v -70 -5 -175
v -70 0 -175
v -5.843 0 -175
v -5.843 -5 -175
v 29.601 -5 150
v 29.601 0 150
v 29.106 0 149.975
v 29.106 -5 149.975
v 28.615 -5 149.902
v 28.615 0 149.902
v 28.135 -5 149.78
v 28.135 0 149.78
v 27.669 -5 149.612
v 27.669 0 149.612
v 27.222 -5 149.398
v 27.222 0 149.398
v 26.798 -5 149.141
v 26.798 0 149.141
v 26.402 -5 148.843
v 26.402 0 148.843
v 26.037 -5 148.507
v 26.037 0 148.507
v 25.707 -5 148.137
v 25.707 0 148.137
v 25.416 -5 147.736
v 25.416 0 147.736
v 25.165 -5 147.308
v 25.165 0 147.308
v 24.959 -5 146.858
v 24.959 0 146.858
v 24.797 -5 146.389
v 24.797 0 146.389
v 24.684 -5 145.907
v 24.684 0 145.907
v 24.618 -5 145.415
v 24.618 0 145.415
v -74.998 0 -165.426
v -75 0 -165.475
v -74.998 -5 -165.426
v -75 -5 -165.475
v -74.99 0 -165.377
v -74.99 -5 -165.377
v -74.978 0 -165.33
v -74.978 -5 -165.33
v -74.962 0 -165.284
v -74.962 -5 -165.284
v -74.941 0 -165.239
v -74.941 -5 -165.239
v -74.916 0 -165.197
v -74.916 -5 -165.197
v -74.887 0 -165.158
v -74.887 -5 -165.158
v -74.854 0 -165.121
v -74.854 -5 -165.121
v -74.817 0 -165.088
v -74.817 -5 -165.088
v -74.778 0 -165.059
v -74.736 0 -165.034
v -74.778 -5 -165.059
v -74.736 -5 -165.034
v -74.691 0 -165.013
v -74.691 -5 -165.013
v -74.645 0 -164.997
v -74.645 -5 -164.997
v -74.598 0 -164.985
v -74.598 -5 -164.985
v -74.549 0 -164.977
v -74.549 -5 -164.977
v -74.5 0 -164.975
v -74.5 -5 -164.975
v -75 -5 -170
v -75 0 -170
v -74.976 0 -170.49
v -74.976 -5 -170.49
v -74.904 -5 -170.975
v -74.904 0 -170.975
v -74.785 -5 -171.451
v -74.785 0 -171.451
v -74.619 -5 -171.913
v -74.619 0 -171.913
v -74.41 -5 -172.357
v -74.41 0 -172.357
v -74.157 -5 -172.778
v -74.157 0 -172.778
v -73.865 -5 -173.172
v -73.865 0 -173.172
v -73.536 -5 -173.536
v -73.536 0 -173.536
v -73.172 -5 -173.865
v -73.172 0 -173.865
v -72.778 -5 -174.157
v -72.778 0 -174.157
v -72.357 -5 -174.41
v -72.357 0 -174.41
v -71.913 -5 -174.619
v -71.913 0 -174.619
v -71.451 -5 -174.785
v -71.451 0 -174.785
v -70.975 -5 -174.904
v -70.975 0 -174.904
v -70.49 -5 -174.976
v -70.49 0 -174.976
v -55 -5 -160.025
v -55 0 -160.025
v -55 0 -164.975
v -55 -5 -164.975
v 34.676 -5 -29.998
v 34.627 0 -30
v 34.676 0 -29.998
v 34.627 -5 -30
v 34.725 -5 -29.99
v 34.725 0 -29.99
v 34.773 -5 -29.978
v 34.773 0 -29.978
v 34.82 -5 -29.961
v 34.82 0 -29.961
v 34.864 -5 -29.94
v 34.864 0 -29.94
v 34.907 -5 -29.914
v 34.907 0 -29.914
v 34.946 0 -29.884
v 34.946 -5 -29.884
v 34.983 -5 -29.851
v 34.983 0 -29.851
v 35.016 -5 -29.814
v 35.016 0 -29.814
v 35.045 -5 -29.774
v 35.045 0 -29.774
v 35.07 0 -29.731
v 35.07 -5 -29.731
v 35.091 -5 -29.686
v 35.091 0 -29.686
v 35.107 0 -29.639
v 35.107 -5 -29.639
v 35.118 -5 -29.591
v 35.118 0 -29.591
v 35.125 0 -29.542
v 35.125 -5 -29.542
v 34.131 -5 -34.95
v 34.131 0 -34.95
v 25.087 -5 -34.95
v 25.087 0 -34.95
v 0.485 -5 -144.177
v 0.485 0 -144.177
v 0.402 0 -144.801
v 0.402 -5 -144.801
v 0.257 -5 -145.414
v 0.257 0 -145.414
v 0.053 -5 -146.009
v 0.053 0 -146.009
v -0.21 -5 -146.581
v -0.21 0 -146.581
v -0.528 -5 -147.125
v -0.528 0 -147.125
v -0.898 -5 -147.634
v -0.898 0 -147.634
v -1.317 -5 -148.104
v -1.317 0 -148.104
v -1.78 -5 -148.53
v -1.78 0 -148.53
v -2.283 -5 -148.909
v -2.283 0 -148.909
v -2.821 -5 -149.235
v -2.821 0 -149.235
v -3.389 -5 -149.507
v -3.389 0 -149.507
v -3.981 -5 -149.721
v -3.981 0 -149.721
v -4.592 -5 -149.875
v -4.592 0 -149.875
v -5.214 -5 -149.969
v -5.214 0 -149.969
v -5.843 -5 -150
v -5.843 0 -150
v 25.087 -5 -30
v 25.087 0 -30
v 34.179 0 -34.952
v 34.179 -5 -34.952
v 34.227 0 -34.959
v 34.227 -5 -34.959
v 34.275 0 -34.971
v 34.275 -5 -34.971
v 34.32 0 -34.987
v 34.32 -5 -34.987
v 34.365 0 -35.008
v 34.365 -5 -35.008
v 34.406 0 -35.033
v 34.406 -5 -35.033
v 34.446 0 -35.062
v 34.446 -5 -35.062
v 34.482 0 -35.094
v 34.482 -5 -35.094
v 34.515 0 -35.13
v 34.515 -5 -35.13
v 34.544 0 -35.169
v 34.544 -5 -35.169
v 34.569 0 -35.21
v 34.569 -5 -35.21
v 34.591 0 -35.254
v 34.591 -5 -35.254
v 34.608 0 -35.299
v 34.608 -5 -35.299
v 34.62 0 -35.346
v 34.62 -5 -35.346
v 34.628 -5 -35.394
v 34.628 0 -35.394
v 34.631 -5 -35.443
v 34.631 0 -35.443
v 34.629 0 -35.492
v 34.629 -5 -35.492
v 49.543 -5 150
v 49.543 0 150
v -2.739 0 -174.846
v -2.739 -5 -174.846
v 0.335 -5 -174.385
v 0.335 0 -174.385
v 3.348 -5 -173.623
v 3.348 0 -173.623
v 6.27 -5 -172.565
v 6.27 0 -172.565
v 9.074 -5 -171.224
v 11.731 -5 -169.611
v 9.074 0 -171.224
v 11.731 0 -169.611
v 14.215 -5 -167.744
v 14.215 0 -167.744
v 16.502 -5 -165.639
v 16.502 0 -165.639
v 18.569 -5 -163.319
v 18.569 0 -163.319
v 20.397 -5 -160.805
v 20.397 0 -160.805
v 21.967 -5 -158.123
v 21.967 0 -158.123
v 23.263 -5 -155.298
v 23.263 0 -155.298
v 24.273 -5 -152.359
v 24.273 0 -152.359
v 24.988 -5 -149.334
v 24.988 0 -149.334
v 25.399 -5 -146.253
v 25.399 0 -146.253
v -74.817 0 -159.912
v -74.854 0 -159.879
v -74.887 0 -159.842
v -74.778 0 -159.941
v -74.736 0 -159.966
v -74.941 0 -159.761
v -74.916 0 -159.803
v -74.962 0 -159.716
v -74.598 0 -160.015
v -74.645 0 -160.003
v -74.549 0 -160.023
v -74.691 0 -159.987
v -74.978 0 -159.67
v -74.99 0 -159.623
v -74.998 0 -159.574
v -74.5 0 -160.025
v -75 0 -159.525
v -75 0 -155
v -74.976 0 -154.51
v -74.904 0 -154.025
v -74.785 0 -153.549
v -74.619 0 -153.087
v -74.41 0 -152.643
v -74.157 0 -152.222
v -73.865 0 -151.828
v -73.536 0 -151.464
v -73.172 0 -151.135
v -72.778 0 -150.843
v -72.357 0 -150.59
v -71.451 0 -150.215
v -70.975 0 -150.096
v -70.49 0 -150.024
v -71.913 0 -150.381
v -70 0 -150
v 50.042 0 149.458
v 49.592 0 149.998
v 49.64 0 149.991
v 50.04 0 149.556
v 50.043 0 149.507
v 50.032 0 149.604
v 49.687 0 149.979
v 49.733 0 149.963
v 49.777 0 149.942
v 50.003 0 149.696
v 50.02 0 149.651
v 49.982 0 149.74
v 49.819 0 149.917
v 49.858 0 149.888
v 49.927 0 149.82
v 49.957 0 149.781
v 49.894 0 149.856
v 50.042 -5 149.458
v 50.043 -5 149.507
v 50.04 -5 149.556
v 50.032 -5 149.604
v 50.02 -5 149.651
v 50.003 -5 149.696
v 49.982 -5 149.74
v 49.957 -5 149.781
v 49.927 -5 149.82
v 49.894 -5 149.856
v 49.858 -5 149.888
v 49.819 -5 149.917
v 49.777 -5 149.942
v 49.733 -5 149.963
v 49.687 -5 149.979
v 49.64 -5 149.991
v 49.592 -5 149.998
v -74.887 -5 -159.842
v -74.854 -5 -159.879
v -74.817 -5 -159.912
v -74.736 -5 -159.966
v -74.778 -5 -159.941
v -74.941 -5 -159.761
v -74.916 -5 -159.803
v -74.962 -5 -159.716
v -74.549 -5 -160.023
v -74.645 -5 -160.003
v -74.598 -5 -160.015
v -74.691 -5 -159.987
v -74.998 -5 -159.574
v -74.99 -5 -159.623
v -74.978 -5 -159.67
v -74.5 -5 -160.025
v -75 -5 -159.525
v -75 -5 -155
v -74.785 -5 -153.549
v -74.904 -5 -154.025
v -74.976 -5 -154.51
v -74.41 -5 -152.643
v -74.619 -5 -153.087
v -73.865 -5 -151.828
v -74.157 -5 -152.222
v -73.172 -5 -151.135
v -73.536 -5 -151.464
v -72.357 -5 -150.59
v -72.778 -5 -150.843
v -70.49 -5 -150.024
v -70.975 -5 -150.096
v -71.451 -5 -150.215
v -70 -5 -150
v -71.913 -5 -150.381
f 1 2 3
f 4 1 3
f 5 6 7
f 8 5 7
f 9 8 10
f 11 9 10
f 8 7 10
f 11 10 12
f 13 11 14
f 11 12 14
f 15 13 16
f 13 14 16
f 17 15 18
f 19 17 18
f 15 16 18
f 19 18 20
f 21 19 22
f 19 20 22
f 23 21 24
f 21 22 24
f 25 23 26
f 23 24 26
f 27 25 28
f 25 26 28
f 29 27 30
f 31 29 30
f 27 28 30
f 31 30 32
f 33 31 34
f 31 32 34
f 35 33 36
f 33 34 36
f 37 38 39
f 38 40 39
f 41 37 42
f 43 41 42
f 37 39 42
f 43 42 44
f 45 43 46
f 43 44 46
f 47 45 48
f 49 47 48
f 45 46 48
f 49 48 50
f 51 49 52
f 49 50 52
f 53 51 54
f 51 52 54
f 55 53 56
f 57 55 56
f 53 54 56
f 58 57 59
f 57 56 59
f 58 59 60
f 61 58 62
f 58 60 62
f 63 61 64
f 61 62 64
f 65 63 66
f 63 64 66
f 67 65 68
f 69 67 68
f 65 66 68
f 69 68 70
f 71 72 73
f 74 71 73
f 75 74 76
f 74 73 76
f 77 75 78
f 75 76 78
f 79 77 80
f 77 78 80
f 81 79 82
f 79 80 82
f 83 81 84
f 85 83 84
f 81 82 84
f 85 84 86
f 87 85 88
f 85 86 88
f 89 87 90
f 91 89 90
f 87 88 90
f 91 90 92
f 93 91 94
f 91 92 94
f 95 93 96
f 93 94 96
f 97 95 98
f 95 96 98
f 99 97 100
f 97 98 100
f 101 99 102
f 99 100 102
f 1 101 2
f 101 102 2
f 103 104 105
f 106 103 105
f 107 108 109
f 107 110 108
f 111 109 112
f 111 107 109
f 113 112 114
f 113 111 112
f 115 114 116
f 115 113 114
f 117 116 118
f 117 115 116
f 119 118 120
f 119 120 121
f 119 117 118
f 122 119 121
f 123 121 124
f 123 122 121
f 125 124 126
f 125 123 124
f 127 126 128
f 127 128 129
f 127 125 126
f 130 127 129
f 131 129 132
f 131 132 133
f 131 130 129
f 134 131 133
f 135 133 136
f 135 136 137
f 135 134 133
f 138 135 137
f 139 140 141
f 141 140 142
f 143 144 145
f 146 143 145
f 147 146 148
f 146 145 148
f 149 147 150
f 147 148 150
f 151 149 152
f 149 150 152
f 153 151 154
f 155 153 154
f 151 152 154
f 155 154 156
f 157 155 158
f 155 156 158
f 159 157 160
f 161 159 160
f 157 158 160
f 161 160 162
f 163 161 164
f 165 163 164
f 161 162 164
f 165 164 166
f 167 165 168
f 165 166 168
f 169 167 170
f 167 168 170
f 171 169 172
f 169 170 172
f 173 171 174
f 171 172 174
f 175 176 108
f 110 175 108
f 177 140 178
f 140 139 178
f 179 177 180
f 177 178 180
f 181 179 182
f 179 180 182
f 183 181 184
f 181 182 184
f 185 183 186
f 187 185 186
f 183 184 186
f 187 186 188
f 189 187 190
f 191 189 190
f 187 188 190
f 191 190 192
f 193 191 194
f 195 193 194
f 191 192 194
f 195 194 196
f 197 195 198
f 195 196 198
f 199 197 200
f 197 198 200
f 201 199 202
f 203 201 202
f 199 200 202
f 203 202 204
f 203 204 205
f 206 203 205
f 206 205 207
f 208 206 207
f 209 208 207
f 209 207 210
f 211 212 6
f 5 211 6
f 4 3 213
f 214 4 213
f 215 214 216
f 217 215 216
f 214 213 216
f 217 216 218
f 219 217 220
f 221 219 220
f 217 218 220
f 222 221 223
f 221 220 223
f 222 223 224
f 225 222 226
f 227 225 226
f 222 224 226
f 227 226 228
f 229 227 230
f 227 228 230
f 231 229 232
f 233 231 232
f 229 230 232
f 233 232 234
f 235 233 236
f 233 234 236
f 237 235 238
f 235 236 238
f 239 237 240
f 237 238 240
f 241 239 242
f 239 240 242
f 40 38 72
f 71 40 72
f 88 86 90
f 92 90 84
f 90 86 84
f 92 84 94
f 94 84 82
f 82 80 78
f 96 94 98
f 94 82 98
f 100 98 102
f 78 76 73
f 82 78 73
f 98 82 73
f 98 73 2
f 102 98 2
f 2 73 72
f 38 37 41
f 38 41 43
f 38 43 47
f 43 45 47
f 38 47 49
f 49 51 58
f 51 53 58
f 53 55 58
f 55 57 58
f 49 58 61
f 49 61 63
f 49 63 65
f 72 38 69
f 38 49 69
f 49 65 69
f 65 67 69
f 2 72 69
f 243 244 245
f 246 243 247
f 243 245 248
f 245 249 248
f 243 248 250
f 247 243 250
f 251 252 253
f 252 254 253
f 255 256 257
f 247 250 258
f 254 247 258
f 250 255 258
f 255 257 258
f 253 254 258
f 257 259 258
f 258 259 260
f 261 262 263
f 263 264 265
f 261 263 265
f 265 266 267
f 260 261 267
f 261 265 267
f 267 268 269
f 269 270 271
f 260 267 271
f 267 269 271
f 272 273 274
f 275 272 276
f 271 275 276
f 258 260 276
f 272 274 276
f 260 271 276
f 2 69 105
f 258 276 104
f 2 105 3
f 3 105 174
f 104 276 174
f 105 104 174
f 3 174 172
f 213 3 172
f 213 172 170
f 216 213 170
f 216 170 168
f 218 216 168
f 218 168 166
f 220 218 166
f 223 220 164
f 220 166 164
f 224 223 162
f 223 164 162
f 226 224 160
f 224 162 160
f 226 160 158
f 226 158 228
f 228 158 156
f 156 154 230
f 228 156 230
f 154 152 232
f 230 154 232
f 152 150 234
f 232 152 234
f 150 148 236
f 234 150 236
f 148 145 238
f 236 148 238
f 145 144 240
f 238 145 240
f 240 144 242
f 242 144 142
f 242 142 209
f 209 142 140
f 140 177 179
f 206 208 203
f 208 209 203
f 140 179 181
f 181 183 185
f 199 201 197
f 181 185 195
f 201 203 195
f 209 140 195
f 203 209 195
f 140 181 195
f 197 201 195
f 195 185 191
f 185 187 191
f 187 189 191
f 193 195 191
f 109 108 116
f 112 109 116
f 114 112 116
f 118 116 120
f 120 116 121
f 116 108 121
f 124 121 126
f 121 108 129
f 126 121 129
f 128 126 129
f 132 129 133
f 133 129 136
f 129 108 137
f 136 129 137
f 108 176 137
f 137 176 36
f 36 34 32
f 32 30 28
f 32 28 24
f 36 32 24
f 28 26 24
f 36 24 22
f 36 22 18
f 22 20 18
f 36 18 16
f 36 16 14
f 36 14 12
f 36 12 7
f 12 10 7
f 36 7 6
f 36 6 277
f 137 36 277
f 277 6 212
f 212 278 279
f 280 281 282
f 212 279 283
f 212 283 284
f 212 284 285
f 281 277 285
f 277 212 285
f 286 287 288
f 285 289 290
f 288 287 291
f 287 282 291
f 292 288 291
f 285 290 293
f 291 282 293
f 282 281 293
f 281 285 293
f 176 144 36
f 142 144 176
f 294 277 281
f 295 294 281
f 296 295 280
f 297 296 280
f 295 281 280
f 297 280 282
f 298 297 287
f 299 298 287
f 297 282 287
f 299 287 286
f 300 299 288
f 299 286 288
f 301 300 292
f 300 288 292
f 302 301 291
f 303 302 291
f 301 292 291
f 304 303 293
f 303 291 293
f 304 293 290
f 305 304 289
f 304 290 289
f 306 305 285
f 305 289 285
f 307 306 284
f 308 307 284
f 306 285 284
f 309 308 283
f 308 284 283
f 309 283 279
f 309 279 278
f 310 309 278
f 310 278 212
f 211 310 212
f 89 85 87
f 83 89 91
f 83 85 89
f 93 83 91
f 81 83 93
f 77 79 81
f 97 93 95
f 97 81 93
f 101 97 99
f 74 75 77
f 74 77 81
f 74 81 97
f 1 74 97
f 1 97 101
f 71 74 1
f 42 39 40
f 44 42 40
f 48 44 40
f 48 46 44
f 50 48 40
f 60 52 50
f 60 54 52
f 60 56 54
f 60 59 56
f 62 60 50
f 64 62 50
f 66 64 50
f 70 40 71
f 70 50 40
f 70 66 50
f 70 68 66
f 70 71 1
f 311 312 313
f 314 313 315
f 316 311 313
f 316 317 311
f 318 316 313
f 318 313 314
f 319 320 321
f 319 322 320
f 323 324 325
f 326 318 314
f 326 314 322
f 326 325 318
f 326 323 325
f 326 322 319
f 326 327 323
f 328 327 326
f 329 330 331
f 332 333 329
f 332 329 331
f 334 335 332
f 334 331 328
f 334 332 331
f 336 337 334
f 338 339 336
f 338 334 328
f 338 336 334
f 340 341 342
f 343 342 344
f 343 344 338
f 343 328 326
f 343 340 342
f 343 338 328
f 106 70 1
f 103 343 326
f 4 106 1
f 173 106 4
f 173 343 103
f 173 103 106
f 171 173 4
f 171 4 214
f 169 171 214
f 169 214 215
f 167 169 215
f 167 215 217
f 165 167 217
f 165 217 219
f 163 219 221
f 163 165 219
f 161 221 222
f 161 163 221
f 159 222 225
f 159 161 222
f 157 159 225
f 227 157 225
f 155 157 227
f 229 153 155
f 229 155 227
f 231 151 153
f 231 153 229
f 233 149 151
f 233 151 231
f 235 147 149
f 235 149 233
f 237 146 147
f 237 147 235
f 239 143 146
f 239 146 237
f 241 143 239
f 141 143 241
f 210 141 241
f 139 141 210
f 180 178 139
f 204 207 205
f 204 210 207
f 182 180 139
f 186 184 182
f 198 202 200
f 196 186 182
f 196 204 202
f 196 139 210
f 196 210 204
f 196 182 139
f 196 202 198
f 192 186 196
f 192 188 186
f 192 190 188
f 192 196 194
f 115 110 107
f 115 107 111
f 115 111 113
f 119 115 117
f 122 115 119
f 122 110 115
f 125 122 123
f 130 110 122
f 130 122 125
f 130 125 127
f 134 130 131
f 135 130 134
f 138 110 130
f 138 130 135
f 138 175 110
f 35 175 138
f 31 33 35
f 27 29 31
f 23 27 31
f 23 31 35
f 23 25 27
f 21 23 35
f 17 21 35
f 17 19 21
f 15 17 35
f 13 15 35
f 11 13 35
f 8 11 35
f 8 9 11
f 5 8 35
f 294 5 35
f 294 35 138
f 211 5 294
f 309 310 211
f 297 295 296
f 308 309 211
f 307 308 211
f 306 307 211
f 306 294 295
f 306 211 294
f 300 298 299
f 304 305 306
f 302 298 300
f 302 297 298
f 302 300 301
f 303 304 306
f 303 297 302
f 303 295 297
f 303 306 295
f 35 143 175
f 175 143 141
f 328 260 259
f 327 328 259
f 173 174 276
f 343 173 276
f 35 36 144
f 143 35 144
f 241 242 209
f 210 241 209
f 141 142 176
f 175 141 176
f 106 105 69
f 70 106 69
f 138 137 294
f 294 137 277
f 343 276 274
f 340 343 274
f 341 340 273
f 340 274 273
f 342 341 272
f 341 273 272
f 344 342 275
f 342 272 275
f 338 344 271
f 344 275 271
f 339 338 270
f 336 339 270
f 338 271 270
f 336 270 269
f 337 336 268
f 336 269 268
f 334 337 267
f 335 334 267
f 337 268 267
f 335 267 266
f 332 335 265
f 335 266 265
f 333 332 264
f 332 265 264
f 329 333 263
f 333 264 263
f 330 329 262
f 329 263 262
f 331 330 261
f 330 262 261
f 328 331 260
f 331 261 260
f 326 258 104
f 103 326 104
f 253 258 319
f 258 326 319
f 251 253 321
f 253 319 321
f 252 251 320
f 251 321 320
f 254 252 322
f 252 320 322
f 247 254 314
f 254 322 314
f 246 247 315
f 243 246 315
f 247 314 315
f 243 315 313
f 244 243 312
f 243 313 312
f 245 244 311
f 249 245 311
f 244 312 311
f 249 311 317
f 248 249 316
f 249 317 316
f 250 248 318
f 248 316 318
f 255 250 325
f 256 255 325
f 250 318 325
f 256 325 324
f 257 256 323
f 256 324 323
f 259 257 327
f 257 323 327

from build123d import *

# Parameters (mm, degrees)
F1_DEPTH = 5
F2_R     = 0.5
F3_R     = 0.5
F4_R     = 0.5


with BuildPart() as f1:
    # F0 (on Front) → F1 (new body)
    with BuildSketch(Plane.XZ):
        with BuildLine():
            ThreePointArc((29.600664, 150), (26.215117, 148.679411), (24.617936, 145.415227))
            Line((24.617936, 145.415227), (0.485222, -144.177339))
            ThreePointArc((0.485222, -144.177339), (-1.543199, -148.322853), (-5.842844, -150))
            Line((-5.842844, -150), (-70, -150))
            ThreePointArc((-70, -150), (-73.535534, -151.464466), (-75, -155))
            Line((-75, -155), (-75, -160.025))
            Line((-75, -160.025), (-55, -160.025))
            Line((-55, -160.025), (-55, -164.975))
            Line((-55, -164.975), (-75, -164.975))
            Line((-75, -164.975), (-75, -170))
            ThreePointArc((-75, -170), (-73.535534, -173.535534), (-70, -175))
            Line((-70, -175), (-5.842844, -175))
            ThreePointArc((-5.842844, -175), (15.384539, -166.71991), (25.398866, -146.253476))
            Line((25.398866, -146.253476), (34.674155, -34.95))
            Line((34.674155, -34.95), (25.086655, -34.95))
            Line((25.086655, -34.95), (25.086655, -30))
            Line((25.086655, -30), (35.086655, -30))
            Line((35.086655, -30), (50.041528, 149.458477))
            ThreePointArc((50.041528, 149.458477), (49.911197, 149.838555), (49.543256, 150))
            Line((49.543256, 150), (29.600664, 150))
        make_face()
    extrude(amount=F1_DEPTH)

    # F2
    f2_edges = [f1.edges().sort_by_distance(p)[0] for p in [
        (35.086655, -2.5, -30),
    ]]
    fillet(f2_edges, radius=F2_R)

    # F3
    f3_edges = [f1.edges().sort_by_distance(p)[0] for p in [
        (34.674155, -2.5, -34.95),
    ]]
    fillet(f3_edges, radius=F3_R)

    # F4
    f4_edges = [f1.edges().sort_by_distance(p)[0] for p in [
        (-75, -2.5, -164.975),
        (-75, -2.5, -160.025),
    ]]
    fillet(f4_edges, radius=F4_R)


solid = f1.part
